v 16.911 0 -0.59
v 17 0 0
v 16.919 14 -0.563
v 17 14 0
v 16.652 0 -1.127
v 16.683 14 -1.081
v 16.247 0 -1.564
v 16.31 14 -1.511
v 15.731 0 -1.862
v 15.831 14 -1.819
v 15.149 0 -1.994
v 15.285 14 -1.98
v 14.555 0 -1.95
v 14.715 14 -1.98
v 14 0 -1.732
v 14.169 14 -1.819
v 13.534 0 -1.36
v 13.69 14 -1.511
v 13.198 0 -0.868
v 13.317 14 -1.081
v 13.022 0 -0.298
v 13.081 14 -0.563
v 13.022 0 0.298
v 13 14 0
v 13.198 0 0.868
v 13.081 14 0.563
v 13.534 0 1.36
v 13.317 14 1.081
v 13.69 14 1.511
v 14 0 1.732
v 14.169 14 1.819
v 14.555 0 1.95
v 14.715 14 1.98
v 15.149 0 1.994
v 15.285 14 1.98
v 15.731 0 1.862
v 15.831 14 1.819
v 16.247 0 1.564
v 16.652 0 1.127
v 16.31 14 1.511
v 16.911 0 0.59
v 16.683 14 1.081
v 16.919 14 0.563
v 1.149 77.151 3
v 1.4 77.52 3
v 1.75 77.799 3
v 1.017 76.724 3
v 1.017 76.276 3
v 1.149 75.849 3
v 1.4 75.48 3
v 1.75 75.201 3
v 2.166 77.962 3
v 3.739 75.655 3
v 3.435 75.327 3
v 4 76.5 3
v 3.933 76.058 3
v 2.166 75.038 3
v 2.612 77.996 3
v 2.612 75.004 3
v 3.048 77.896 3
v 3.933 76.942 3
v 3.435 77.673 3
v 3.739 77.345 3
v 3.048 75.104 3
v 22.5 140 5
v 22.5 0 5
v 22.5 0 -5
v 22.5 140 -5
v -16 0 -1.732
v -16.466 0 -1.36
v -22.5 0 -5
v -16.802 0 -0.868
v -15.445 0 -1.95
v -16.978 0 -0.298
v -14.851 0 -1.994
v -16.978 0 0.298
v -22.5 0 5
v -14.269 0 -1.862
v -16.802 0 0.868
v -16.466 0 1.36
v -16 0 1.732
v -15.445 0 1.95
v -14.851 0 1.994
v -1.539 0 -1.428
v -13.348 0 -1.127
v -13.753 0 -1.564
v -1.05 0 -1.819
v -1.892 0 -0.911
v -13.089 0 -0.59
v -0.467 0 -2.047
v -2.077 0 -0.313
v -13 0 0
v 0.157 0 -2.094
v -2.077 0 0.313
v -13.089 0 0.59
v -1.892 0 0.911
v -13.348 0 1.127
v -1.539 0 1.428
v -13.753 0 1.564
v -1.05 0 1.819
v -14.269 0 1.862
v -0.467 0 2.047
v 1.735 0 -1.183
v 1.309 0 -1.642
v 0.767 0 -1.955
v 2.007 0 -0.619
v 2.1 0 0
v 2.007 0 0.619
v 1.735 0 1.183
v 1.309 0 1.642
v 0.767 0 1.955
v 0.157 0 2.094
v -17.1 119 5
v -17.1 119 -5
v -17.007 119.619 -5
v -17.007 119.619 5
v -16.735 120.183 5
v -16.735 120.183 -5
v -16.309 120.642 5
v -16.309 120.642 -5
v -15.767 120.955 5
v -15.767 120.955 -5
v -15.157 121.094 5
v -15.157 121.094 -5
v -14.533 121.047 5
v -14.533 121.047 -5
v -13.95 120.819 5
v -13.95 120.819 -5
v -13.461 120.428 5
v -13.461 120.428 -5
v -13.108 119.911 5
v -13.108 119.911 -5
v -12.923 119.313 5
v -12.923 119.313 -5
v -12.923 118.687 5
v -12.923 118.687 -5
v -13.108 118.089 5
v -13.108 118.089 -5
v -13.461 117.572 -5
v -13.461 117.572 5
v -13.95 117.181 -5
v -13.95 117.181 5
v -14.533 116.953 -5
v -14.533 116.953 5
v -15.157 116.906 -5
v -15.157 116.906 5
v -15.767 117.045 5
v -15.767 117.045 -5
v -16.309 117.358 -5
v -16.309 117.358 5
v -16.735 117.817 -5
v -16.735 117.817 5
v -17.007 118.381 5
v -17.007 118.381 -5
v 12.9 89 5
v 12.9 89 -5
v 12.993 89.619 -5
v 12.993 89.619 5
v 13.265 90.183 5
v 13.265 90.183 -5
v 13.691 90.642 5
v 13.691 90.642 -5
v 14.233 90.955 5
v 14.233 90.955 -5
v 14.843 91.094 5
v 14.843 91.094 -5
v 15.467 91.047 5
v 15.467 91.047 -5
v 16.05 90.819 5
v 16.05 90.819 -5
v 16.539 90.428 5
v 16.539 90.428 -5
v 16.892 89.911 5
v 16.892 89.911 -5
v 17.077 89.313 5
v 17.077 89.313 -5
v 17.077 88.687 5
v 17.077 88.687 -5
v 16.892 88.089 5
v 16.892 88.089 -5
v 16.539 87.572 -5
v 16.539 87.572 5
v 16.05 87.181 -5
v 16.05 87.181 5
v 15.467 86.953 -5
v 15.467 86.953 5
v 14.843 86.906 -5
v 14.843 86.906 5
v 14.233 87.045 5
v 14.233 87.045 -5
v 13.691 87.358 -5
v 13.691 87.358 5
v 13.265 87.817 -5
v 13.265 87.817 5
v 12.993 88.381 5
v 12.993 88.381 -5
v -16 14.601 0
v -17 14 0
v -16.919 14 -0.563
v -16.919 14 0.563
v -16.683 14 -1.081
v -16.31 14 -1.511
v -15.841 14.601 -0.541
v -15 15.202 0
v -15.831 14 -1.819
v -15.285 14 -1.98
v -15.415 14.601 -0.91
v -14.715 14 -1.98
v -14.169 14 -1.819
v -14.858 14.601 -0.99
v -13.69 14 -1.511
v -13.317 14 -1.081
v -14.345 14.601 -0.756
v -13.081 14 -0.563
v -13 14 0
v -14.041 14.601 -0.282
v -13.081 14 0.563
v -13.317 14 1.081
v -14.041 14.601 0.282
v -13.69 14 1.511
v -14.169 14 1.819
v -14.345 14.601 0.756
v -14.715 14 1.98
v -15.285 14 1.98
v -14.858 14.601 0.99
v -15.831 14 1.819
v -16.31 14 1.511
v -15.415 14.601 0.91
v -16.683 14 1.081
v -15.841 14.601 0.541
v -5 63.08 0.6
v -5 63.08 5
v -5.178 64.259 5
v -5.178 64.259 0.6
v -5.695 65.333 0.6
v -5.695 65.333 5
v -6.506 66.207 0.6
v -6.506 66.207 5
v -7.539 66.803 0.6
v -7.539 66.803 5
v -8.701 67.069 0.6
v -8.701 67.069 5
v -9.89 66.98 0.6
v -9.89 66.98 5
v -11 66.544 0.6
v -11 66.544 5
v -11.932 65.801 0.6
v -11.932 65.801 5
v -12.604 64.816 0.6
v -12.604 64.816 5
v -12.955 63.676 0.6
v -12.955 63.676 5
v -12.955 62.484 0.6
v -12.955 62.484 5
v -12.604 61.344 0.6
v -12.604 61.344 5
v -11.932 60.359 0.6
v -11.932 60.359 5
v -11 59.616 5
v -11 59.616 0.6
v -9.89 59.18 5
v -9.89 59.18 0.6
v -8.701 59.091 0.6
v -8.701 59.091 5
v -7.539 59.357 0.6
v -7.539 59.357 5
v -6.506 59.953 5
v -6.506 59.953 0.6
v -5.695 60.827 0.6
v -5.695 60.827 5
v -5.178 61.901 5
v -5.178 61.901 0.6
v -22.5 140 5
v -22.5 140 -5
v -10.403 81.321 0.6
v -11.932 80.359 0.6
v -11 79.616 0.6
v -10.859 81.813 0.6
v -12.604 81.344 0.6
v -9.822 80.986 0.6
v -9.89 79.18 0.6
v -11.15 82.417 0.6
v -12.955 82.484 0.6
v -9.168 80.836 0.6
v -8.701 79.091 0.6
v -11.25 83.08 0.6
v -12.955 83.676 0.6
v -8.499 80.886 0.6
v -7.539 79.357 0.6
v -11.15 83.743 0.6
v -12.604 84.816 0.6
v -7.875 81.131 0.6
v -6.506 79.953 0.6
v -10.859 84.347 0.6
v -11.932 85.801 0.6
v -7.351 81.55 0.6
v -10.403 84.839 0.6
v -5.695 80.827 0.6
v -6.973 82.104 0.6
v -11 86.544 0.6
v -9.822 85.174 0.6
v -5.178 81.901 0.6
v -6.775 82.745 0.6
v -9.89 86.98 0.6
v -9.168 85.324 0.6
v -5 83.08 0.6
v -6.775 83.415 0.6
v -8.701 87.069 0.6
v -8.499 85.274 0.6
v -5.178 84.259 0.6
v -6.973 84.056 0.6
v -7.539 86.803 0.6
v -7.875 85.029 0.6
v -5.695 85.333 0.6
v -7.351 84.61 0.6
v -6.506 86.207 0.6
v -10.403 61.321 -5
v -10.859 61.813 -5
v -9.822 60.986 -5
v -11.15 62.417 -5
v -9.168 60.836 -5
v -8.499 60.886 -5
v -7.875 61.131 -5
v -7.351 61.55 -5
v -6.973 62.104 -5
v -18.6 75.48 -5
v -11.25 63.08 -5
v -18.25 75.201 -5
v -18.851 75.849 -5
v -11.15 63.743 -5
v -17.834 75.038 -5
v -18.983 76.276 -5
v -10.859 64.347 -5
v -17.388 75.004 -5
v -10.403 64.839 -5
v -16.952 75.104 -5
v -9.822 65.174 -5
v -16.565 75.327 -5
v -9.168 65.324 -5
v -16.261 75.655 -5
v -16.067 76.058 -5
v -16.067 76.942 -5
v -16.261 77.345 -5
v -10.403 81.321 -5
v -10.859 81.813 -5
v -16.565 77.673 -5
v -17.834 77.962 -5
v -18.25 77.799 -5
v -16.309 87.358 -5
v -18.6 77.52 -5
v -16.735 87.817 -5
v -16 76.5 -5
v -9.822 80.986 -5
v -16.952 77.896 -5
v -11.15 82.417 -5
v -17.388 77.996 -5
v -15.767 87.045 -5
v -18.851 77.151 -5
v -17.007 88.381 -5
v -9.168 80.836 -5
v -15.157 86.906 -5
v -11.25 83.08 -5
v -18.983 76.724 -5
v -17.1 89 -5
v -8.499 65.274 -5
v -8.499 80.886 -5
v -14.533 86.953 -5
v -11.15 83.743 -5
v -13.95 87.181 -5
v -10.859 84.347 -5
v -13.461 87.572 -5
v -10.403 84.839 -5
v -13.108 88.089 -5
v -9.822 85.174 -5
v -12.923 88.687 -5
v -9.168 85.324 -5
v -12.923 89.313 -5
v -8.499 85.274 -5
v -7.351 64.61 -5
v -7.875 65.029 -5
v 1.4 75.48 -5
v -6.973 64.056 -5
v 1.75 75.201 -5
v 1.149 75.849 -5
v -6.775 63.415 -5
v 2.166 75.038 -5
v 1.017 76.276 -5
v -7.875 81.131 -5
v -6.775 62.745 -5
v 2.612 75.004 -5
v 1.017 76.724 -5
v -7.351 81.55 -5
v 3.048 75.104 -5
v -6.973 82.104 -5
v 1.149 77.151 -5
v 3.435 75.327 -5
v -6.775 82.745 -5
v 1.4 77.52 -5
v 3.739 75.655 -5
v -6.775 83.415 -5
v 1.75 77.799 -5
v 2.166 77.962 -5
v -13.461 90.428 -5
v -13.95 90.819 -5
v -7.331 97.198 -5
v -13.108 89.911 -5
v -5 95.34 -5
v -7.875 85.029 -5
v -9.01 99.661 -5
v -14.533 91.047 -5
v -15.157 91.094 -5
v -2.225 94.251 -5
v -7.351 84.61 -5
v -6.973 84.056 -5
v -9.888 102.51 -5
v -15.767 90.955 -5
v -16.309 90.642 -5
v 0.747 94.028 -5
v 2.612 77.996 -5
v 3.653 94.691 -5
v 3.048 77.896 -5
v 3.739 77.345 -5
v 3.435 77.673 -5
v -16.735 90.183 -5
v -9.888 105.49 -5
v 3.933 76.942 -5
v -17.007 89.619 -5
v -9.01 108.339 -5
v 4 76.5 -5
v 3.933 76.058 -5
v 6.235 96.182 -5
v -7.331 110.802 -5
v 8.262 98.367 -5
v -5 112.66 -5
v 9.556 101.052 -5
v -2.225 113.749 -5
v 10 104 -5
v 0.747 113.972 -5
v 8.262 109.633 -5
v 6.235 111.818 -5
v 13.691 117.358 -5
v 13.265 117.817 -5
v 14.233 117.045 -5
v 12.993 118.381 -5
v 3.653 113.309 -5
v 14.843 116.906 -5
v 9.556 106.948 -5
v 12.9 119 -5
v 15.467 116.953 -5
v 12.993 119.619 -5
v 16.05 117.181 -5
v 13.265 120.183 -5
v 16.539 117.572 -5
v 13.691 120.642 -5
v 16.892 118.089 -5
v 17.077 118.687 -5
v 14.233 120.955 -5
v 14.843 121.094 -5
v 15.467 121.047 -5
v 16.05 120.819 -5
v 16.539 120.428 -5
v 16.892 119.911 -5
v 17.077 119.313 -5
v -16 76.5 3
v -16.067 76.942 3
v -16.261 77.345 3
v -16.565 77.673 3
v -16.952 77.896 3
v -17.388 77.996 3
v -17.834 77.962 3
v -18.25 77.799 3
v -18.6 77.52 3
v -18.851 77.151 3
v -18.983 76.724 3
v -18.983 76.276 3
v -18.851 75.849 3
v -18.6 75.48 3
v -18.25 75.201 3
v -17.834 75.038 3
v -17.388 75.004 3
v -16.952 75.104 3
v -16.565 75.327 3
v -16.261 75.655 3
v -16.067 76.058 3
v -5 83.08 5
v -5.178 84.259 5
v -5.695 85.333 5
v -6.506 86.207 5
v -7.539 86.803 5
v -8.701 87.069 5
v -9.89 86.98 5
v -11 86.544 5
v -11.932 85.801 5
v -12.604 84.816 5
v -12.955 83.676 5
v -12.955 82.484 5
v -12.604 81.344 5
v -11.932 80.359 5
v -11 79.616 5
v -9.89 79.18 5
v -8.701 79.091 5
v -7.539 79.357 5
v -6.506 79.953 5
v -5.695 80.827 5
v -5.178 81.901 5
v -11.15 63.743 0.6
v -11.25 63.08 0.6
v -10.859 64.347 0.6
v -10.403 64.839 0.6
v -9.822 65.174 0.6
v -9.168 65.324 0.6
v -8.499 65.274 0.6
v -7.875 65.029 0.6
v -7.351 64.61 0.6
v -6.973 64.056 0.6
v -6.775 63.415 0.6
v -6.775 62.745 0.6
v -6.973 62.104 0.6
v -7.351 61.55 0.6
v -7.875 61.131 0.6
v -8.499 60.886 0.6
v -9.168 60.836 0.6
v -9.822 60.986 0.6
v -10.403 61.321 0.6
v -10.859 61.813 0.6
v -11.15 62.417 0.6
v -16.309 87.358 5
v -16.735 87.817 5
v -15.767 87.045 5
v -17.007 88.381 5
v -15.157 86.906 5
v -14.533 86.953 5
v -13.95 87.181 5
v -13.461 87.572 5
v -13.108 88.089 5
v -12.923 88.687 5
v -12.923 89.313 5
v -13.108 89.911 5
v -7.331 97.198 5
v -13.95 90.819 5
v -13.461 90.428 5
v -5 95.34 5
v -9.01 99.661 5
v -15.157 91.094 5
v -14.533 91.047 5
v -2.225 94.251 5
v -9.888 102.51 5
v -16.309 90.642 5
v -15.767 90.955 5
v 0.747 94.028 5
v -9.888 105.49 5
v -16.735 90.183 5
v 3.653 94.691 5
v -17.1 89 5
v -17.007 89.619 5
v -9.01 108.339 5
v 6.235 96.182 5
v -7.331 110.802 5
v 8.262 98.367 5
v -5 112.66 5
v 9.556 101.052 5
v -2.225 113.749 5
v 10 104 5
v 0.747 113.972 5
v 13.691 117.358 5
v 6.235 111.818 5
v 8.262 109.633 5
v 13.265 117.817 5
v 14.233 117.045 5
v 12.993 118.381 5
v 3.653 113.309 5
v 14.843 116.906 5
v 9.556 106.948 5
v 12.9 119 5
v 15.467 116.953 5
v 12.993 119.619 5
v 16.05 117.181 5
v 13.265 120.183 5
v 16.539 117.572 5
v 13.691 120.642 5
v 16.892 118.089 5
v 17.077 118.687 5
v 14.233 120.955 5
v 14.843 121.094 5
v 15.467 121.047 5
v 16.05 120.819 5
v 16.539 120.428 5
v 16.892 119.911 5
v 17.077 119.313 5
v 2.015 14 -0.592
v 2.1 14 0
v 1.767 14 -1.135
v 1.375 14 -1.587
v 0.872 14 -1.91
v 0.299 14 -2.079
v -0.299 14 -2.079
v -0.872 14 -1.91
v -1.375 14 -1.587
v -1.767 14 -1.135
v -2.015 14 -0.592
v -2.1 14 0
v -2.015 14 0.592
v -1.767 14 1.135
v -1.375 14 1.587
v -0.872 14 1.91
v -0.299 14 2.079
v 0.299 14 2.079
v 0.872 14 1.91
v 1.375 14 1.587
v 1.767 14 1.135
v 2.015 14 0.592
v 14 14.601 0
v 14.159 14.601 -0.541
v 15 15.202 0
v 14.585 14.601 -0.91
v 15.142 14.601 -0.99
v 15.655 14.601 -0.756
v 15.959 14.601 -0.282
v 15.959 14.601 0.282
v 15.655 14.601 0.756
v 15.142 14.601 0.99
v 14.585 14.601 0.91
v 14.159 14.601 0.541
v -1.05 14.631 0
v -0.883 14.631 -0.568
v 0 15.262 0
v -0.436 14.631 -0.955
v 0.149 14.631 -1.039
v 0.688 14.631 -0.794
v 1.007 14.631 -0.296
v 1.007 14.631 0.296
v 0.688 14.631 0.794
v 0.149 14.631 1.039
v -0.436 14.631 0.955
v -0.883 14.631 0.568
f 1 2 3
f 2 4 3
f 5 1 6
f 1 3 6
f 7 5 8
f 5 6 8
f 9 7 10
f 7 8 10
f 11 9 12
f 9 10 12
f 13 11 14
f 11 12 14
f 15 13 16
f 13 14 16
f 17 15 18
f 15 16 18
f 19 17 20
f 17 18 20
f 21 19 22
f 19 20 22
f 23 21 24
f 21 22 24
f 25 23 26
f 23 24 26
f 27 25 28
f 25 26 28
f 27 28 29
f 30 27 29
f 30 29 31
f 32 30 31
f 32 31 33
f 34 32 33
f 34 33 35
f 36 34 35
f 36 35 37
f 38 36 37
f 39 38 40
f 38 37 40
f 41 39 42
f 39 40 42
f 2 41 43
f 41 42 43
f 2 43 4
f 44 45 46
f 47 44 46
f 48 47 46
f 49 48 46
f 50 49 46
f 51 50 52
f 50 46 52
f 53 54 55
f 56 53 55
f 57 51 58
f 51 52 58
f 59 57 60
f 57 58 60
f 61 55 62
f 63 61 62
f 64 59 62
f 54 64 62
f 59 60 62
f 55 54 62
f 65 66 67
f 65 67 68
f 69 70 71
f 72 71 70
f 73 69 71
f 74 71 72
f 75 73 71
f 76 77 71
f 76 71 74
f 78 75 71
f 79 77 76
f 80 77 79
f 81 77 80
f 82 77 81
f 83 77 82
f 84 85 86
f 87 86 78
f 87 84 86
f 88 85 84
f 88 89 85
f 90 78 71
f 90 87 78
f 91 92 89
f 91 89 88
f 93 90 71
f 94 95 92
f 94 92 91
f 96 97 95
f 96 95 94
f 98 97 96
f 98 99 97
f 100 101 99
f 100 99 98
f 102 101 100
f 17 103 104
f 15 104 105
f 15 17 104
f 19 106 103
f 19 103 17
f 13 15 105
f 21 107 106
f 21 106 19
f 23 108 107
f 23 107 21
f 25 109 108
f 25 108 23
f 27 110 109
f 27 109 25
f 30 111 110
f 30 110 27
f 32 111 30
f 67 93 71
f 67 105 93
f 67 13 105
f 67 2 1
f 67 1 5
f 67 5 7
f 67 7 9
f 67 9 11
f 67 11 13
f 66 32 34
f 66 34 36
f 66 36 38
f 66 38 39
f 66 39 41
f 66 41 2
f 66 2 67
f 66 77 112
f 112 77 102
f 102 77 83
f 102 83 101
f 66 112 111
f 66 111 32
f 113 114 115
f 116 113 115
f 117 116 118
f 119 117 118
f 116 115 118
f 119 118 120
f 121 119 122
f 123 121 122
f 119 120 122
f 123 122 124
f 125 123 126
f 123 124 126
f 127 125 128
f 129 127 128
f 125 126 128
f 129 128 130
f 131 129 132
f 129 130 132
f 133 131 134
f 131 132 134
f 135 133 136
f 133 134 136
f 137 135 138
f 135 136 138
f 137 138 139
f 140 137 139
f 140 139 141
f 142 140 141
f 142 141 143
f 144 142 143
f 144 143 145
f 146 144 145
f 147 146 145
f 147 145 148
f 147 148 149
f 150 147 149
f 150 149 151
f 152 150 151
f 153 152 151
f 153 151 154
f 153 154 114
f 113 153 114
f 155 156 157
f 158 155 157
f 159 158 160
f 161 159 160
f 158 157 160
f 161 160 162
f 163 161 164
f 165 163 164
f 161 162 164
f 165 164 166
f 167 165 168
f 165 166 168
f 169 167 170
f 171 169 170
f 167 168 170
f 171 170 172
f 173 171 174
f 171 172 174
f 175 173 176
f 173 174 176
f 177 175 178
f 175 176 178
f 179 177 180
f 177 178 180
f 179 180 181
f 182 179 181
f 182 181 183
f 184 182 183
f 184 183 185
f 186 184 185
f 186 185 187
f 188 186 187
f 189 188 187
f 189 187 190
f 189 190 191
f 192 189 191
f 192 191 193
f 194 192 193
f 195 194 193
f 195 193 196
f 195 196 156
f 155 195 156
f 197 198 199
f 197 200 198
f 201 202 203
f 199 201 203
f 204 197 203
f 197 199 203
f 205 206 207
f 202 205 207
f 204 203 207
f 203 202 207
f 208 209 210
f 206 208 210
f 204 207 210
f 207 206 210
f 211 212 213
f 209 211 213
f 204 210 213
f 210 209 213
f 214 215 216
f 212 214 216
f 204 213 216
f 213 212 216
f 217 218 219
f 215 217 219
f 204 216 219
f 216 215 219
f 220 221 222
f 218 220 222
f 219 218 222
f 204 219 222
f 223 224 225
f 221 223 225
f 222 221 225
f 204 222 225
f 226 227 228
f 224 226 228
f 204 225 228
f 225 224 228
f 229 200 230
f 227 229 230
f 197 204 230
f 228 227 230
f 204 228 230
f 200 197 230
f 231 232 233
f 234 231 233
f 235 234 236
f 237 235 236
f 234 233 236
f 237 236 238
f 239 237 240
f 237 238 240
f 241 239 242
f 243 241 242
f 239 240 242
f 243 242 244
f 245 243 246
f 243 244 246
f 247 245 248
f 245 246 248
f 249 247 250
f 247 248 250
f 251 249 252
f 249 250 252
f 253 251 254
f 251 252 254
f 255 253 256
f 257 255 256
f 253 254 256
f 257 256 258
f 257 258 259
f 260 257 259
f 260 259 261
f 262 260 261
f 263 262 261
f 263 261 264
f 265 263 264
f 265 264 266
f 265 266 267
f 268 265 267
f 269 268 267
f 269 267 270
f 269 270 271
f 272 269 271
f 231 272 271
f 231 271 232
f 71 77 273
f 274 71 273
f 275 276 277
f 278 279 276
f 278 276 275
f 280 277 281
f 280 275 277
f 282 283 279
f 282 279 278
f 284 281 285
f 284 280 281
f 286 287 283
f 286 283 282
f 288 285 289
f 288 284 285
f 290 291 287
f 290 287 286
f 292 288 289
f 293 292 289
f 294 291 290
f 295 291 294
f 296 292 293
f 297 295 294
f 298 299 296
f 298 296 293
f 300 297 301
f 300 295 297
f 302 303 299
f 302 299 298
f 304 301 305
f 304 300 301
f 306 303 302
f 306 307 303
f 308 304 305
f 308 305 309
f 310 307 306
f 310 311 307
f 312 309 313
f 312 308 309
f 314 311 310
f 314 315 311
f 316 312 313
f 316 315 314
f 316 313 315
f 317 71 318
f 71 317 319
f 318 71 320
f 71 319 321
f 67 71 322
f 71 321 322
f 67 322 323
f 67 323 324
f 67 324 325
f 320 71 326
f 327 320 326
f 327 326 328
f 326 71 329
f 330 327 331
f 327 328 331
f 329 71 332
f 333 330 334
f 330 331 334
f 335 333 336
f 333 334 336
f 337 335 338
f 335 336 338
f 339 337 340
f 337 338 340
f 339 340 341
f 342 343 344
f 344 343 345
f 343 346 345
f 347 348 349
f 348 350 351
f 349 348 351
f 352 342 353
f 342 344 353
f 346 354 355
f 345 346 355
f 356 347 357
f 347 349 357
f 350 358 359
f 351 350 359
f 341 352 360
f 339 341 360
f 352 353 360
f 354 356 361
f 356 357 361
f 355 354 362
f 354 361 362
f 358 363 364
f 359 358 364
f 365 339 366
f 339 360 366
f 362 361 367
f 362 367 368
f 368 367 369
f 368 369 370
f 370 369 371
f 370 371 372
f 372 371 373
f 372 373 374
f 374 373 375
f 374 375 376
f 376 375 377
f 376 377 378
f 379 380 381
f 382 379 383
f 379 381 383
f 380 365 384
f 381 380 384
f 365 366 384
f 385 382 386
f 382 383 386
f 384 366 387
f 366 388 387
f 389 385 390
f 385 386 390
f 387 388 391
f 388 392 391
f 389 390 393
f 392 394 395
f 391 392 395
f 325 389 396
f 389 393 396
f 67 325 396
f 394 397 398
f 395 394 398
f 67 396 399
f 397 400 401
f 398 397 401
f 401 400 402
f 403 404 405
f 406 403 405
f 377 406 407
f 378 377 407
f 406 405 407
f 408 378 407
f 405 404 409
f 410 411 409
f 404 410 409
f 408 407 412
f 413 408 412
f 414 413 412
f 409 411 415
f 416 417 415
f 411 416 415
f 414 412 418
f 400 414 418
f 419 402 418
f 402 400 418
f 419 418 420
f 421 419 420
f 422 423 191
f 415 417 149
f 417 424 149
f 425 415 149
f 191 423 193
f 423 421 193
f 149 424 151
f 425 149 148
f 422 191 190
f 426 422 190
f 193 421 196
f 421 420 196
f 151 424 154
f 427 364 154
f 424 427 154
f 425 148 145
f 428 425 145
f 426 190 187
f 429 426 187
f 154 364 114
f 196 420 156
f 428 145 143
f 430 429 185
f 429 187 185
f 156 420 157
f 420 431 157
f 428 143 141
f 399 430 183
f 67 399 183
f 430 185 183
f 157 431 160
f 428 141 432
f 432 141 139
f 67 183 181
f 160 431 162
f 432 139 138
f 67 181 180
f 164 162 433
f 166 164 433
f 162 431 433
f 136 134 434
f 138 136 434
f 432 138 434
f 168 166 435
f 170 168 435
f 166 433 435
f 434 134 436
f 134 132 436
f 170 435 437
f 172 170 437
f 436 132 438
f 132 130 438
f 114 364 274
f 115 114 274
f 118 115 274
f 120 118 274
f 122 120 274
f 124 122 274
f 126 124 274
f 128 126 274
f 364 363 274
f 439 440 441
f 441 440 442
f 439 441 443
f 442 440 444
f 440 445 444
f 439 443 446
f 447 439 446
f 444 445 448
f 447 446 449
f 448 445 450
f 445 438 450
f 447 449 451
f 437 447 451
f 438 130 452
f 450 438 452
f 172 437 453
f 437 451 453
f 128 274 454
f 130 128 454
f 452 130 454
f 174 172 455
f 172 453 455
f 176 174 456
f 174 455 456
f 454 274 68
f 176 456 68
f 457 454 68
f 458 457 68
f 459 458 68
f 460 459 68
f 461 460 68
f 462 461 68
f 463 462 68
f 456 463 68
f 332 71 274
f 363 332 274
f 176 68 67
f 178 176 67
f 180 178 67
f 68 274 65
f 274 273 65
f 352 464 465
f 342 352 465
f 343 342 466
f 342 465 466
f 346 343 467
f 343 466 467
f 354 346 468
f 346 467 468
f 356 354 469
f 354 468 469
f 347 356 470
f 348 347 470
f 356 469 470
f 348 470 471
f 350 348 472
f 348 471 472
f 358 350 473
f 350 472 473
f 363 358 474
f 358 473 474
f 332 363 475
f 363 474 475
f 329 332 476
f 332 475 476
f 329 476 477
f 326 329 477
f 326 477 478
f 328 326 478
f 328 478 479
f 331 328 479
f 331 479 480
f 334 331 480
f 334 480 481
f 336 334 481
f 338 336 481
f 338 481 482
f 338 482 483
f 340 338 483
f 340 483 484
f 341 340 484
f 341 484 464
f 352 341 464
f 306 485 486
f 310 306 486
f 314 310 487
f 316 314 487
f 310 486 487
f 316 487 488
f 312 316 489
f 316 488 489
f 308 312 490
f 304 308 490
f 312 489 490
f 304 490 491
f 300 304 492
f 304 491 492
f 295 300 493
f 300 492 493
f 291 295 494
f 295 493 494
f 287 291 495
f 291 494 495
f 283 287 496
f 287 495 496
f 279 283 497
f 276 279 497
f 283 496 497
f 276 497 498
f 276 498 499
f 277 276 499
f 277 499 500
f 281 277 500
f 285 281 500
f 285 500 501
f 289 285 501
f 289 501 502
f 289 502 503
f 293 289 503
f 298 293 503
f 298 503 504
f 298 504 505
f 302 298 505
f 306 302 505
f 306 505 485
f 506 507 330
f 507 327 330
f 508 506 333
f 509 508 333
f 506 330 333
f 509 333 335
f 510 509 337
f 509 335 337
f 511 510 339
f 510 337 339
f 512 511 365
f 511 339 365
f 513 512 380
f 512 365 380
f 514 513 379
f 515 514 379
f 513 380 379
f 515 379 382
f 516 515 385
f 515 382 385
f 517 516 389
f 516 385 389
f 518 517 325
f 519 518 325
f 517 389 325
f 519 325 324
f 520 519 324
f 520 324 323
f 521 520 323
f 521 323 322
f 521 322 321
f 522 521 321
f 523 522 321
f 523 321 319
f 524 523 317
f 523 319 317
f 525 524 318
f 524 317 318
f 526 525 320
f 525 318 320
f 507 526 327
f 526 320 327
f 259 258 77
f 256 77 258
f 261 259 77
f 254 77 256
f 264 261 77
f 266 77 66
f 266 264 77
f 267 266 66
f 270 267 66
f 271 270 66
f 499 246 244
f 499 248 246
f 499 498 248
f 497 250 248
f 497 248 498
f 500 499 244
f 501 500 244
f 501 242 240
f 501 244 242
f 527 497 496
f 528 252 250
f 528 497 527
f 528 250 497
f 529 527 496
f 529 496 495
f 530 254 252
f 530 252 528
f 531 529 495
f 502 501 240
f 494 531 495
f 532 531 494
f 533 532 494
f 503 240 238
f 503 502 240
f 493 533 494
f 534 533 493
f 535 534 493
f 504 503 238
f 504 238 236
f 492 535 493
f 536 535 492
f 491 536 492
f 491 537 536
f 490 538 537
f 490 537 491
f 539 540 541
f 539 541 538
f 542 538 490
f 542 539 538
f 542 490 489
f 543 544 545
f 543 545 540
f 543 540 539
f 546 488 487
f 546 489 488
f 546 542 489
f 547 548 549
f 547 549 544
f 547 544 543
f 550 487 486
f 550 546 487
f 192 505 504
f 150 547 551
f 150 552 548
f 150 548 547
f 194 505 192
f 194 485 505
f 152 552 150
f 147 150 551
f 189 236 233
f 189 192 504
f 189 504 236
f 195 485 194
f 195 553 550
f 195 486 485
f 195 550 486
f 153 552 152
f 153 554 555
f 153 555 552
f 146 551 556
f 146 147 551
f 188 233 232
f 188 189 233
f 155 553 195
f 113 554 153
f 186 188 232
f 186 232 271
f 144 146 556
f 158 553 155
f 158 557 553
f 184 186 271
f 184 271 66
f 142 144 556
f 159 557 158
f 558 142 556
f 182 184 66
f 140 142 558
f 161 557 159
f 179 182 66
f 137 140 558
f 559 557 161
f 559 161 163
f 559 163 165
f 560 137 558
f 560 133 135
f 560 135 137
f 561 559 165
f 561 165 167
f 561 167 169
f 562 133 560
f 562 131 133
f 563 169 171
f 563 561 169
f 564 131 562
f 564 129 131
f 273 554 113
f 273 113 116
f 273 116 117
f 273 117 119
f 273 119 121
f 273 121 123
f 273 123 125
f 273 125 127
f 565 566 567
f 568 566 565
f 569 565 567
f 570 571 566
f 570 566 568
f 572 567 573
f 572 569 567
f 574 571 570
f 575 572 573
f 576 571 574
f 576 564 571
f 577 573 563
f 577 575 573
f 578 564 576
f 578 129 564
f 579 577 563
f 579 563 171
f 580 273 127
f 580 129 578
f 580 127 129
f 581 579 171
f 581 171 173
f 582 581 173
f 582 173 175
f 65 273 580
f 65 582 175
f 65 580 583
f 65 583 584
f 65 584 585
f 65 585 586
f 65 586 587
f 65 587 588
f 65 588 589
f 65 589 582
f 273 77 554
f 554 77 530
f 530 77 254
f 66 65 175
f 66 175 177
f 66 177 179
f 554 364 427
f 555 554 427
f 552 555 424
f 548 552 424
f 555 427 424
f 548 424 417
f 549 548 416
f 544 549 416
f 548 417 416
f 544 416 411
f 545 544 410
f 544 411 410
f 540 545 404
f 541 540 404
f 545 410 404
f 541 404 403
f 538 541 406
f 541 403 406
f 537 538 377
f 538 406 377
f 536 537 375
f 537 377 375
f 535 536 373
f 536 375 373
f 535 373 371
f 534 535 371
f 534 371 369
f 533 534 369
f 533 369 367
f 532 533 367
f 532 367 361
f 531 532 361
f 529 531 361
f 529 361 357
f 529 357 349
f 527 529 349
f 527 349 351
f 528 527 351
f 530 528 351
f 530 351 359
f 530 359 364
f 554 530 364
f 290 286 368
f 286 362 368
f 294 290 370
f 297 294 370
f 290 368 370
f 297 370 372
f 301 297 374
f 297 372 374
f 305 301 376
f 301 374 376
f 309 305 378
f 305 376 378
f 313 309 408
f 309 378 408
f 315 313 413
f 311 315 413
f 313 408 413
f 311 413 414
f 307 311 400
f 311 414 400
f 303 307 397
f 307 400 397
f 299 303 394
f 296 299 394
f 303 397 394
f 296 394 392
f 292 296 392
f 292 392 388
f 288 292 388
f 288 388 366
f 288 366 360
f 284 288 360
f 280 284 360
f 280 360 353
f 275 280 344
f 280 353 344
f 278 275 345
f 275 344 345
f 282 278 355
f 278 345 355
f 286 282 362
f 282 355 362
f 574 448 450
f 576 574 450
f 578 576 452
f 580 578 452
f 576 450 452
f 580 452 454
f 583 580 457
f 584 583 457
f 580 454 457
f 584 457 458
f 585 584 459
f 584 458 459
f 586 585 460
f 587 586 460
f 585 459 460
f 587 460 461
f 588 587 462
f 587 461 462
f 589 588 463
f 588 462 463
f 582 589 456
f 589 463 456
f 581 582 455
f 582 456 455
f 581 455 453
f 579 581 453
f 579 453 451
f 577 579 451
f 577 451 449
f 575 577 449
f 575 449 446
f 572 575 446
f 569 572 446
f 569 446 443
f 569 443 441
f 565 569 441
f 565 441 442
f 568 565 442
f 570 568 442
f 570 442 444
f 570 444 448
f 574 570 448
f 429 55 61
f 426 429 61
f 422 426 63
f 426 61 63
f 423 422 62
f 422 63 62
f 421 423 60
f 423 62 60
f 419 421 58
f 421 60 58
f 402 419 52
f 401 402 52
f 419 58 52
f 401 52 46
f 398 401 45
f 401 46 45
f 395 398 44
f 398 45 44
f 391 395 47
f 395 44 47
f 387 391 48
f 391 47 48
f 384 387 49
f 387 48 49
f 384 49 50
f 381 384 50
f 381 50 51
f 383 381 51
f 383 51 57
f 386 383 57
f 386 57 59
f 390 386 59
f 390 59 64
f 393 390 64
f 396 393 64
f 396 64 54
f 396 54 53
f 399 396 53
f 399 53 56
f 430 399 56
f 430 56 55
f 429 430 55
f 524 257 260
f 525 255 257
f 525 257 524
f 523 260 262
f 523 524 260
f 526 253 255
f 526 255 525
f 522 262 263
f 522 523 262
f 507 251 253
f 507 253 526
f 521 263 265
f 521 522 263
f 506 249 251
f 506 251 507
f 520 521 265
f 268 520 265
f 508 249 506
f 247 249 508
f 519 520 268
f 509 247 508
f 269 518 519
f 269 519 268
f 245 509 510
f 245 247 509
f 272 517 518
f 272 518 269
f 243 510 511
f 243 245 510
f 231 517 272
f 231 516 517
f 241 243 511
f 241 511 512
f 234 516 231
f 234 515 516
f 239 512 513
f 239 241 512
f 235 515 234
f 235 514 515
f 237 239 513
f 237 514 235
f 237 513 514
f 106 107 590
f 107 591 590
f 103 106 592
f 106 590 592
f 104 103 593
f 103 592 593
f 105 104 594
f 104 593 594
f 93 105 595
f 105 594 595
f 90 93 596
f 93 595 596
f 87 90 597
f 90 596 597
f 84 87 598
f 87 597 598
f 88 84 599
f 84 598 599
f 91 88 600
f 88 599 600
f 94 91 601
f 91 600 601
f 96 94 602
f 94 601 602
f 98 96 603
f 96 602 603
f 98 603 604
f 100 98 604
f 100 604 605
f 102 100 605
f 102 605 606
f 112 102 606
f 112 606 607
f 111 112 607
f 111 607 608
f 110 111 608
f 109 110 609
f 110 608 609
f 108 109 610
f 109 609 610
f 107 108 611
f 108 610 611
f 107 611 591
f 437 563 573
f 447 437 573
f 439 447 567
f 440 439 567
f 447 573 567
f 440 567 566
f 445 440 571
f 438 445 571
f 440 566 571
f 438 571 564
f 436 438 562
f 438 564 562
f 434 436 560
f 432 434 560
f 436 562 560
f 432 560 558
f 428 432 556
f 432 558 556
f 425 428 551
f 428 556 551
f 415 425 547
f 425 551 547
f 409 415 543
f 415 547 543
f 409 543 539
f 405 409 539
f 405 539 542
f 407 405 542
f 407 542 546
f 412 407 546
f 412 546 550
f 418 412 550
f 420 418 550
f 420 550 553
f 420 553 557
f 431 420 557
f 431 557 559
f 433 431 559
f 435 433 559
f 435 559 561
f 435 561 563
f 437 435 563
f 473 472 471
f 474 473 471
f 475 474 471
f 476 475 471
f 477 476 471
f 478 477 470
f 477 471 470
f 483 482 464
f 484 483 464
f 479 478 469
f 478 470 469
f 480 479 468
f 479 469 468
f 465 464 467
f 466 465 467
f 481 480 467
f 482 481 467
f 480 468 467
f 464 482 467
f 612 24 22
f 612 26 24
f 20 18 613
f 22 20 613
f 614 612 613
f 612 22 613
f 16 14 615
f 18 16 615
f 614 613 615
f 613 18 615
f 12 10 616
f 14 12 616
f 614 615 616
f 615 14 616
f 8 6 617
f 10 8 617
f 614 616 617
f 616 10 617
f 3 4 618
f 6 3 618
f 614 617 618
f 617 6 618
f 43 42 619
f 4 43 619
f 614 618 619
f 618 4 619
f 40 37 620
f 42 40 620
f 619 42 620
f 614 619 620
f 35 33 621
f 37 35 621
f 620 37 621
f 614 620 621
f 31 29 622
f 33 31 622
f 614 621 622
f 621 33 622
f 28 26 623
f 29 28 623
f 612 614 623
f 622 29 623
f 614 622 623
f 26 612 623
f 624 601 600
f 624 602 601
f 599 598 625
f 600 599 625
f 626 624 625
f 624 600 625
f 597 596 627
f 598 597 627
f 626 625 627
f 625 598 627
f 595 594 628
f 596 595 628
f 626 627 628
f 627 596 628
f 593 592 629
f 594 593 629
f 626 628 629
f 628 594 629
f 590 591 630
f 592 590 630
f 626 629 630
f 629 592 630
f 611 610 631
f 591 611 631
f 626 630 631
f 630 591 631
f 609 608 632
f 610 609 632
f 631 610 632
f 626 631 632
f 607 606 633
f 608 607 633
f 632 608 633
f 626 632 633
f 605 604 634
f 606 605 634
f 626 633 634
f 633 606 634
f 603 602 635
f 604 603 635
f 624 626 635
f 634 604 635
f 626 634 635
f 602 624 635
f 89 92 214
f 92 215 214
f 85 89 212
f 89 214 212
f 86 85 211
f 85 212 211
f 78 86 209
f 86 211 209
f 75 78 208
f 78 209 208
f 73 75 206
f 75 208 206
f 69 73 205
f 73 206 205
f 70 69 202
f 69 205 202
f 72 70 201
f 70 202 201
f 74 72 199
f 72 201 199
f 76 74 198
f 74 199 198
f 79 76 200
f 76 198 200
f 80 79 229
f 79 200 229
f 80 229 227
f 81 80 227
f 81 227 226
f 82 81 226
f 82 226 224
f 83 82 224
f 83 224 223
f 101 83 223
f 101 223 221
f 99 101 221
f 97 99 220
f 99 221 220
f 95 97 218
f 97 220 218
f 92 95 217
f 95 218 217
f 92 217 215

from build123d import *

# Parameters (mm, degrees)
SKIZZE1_W                                            = 45
SKIZZE1_H                                            = 140
AUFSATZ_LINEAR_AUSTRAGEN1_DEPTH                      = 5
STIRNSENKUNG_F_R_M4_ZYLINDERSCHRAUBE_MIT_D           = 4.5
STIRNSENKUNG_F_R_M4_ZYLINDERSCHRAUBE_MIT_CBORE_D     = 8
STIRNSENKUNG_F_R_M4_ZYLINDERSCHRAUBE_MIT_CBORE_DEPTH = 4.4
M5_GEWINDEBOHRUNG1_D                                 = 4.2
LINEARES_MUSTER1_COUNT                               = 2
LINEARES_MUSTER1_PITCH                               = 20
M5_GEWINDEBOHRUNG2_D                                 = 4.2
M5_GEWINDEBOHRUNG2_DEPTH                             = 14
M5_GEWINDEBOHRUNG2_TIP                               = 1.2618073
F_4_0_4_DURCHMESSER_BOHRUNG1_D                       = 4
F_4_0_4_DURCHMESSER_BOHRUNG1_DEPTH                   = 14
F_4_0_4_DURCHMESSER_BOHRUNG1_TIP                     = 1.201721238
F_3_0_3_DURCHMESSER_BOHRUNG1_D                       = 3
F_3_0_3_DURCHMESSER_BOHRUNG1_DEPTH                   = 8
F_20_0_20_DURCHMESSER_BOHRUNG1_D                     = 20


with BuildPart() as part:
    # Skizze1 → Aufsatz-Linear austragen1 (new, symmetric)
    with BuildSketch(Plane.XY):
        with Locations((0, 70)):
            Rectangle(SKIZZE1_W, SKIZZE1_H)
    extrude(amount=AUFSATZ_LINEAR_AUSTRAGEN1_DEPTH, both=True)

    # Stirnsenkung für M4 Zylinderschraube mit Innensechskant1 (through all)
    with Locations(Plane.XY.offset(5)):
        with Locations((-9, 83.08)):
            stirnsenkung_f_r_m4_zylinderschraube_mit = CounterBoreHole(STIRNSENKUNG_F_R_M4_ZYLINDERSCHRAUBE_MIT_D / 2, STIRNSENKUNG_F_R_M4_ZYLINDERSCHRAUBE_MIT_CBORE_D / 2, STIRNSENKUNG_F_R_M4_ZYLINDERSCHRAUBE_MIT_CBORE_DEPTH)

    # M5 Gewindebohrung1 (through all)
    with Locations(Plane.XY.offset(5)):
        with Locations((15, 119), (-15, 89), (-15, 119), (15, 89)):
            Hole(M5_GEWINDEBOHRUNG1_D / 2)

    # Lineares Muster1: Stirnsenkung für M4 Zylinderschraube mit Innensechskant1 ×2
    with Locations(*[(0, -i * LINEARES_MUSTER1_PITCH, 0) for i in range(1, LINEARES_MUSTER1_COUNT)]):
        add(stirnsenkung_f_r_m4_zylinderschraube_mit, mode=Mode.SUBTRACT)

    # M5 Gewindebohrung2
    with Locations(Plane(origin=(0, 0, 0), x_dir=(-1, 0, 0), z_dir=(0, -1, 0))):
        with Locations((0, 0)):
            Hole(M5_GEWINDEBOHRUNG2_D / 2, depth=M5_GEWINDEBOHRUNG2_DEPTH)
            with Locations((0, 0, -(M5_GEWINDEBOHRUNG2_DEPTH + M5_GEWINDEBOHRUNG2_TIP / 2))):  # 118° drill point
                Cone(0, M5_GEWINDEBOHRUNG2_D / 2, M5_GEWINDEBOHRUNG2_TIP, mode=Mode.SUBTRACT)

    # Ø4.0 (4) Durchmesser Bohrung1
    with Locations(Plane(origin=(0, 0, 0), x_dir=(-1, 0, 0), z_dir=(0, -1, 0))):
        with Locations((15, 0), (-15, 0)):
            Hole(F_4_0_4_DURCHMESSER_BOHRUNG1_D / 2, depth=F_4_0_4_DURCHMESSER_BOHRUNG1_DEPTH)
            with Locations((0, 0, -(F_4_0_4_DURCHMESSER_BOHRUNG1_DEPTH + F_4_0_4_DURCHMESSER_BOHRUNG1_TIP / 2))):  # 118° drill point
                Cone(0, F_4_0_4_DURCHMESSER_BOHRUNG1_D / 2, F_4_0_4_DURCHMESSER_BOHRUNG1_TIP, mode=Mode.SUBTRACT)

    # Ø3.0 (3) Durchmesser Bohrung1
    with Locations(Plane(origin=(0, 0, -5), x_dir=(-1, 0, 0), z_dir=(0, 0, -1))):
        with Locations((17.5, 76.5), (-2.5, 76.5)):
            Hole(F_3_0_3_DURCHMESSER_BOHRUNG1_D / 2, depth=F_3_0_3_DURCHMESSER_BOHRUNG1_DEPTH)

    # Ø20.0 (20) Durchmesser Bohrung1 (through all)
    with Locations(Plane(origin=(0, 0, -5), x_dir=(-1, 0, 0), z_dir=(0, 0, -1))):
        with Locations((0, 104)):
            Hole(F_20_0_20_DURCHMESSER_BOHRUNG1_D / 2)


solid = part.part
